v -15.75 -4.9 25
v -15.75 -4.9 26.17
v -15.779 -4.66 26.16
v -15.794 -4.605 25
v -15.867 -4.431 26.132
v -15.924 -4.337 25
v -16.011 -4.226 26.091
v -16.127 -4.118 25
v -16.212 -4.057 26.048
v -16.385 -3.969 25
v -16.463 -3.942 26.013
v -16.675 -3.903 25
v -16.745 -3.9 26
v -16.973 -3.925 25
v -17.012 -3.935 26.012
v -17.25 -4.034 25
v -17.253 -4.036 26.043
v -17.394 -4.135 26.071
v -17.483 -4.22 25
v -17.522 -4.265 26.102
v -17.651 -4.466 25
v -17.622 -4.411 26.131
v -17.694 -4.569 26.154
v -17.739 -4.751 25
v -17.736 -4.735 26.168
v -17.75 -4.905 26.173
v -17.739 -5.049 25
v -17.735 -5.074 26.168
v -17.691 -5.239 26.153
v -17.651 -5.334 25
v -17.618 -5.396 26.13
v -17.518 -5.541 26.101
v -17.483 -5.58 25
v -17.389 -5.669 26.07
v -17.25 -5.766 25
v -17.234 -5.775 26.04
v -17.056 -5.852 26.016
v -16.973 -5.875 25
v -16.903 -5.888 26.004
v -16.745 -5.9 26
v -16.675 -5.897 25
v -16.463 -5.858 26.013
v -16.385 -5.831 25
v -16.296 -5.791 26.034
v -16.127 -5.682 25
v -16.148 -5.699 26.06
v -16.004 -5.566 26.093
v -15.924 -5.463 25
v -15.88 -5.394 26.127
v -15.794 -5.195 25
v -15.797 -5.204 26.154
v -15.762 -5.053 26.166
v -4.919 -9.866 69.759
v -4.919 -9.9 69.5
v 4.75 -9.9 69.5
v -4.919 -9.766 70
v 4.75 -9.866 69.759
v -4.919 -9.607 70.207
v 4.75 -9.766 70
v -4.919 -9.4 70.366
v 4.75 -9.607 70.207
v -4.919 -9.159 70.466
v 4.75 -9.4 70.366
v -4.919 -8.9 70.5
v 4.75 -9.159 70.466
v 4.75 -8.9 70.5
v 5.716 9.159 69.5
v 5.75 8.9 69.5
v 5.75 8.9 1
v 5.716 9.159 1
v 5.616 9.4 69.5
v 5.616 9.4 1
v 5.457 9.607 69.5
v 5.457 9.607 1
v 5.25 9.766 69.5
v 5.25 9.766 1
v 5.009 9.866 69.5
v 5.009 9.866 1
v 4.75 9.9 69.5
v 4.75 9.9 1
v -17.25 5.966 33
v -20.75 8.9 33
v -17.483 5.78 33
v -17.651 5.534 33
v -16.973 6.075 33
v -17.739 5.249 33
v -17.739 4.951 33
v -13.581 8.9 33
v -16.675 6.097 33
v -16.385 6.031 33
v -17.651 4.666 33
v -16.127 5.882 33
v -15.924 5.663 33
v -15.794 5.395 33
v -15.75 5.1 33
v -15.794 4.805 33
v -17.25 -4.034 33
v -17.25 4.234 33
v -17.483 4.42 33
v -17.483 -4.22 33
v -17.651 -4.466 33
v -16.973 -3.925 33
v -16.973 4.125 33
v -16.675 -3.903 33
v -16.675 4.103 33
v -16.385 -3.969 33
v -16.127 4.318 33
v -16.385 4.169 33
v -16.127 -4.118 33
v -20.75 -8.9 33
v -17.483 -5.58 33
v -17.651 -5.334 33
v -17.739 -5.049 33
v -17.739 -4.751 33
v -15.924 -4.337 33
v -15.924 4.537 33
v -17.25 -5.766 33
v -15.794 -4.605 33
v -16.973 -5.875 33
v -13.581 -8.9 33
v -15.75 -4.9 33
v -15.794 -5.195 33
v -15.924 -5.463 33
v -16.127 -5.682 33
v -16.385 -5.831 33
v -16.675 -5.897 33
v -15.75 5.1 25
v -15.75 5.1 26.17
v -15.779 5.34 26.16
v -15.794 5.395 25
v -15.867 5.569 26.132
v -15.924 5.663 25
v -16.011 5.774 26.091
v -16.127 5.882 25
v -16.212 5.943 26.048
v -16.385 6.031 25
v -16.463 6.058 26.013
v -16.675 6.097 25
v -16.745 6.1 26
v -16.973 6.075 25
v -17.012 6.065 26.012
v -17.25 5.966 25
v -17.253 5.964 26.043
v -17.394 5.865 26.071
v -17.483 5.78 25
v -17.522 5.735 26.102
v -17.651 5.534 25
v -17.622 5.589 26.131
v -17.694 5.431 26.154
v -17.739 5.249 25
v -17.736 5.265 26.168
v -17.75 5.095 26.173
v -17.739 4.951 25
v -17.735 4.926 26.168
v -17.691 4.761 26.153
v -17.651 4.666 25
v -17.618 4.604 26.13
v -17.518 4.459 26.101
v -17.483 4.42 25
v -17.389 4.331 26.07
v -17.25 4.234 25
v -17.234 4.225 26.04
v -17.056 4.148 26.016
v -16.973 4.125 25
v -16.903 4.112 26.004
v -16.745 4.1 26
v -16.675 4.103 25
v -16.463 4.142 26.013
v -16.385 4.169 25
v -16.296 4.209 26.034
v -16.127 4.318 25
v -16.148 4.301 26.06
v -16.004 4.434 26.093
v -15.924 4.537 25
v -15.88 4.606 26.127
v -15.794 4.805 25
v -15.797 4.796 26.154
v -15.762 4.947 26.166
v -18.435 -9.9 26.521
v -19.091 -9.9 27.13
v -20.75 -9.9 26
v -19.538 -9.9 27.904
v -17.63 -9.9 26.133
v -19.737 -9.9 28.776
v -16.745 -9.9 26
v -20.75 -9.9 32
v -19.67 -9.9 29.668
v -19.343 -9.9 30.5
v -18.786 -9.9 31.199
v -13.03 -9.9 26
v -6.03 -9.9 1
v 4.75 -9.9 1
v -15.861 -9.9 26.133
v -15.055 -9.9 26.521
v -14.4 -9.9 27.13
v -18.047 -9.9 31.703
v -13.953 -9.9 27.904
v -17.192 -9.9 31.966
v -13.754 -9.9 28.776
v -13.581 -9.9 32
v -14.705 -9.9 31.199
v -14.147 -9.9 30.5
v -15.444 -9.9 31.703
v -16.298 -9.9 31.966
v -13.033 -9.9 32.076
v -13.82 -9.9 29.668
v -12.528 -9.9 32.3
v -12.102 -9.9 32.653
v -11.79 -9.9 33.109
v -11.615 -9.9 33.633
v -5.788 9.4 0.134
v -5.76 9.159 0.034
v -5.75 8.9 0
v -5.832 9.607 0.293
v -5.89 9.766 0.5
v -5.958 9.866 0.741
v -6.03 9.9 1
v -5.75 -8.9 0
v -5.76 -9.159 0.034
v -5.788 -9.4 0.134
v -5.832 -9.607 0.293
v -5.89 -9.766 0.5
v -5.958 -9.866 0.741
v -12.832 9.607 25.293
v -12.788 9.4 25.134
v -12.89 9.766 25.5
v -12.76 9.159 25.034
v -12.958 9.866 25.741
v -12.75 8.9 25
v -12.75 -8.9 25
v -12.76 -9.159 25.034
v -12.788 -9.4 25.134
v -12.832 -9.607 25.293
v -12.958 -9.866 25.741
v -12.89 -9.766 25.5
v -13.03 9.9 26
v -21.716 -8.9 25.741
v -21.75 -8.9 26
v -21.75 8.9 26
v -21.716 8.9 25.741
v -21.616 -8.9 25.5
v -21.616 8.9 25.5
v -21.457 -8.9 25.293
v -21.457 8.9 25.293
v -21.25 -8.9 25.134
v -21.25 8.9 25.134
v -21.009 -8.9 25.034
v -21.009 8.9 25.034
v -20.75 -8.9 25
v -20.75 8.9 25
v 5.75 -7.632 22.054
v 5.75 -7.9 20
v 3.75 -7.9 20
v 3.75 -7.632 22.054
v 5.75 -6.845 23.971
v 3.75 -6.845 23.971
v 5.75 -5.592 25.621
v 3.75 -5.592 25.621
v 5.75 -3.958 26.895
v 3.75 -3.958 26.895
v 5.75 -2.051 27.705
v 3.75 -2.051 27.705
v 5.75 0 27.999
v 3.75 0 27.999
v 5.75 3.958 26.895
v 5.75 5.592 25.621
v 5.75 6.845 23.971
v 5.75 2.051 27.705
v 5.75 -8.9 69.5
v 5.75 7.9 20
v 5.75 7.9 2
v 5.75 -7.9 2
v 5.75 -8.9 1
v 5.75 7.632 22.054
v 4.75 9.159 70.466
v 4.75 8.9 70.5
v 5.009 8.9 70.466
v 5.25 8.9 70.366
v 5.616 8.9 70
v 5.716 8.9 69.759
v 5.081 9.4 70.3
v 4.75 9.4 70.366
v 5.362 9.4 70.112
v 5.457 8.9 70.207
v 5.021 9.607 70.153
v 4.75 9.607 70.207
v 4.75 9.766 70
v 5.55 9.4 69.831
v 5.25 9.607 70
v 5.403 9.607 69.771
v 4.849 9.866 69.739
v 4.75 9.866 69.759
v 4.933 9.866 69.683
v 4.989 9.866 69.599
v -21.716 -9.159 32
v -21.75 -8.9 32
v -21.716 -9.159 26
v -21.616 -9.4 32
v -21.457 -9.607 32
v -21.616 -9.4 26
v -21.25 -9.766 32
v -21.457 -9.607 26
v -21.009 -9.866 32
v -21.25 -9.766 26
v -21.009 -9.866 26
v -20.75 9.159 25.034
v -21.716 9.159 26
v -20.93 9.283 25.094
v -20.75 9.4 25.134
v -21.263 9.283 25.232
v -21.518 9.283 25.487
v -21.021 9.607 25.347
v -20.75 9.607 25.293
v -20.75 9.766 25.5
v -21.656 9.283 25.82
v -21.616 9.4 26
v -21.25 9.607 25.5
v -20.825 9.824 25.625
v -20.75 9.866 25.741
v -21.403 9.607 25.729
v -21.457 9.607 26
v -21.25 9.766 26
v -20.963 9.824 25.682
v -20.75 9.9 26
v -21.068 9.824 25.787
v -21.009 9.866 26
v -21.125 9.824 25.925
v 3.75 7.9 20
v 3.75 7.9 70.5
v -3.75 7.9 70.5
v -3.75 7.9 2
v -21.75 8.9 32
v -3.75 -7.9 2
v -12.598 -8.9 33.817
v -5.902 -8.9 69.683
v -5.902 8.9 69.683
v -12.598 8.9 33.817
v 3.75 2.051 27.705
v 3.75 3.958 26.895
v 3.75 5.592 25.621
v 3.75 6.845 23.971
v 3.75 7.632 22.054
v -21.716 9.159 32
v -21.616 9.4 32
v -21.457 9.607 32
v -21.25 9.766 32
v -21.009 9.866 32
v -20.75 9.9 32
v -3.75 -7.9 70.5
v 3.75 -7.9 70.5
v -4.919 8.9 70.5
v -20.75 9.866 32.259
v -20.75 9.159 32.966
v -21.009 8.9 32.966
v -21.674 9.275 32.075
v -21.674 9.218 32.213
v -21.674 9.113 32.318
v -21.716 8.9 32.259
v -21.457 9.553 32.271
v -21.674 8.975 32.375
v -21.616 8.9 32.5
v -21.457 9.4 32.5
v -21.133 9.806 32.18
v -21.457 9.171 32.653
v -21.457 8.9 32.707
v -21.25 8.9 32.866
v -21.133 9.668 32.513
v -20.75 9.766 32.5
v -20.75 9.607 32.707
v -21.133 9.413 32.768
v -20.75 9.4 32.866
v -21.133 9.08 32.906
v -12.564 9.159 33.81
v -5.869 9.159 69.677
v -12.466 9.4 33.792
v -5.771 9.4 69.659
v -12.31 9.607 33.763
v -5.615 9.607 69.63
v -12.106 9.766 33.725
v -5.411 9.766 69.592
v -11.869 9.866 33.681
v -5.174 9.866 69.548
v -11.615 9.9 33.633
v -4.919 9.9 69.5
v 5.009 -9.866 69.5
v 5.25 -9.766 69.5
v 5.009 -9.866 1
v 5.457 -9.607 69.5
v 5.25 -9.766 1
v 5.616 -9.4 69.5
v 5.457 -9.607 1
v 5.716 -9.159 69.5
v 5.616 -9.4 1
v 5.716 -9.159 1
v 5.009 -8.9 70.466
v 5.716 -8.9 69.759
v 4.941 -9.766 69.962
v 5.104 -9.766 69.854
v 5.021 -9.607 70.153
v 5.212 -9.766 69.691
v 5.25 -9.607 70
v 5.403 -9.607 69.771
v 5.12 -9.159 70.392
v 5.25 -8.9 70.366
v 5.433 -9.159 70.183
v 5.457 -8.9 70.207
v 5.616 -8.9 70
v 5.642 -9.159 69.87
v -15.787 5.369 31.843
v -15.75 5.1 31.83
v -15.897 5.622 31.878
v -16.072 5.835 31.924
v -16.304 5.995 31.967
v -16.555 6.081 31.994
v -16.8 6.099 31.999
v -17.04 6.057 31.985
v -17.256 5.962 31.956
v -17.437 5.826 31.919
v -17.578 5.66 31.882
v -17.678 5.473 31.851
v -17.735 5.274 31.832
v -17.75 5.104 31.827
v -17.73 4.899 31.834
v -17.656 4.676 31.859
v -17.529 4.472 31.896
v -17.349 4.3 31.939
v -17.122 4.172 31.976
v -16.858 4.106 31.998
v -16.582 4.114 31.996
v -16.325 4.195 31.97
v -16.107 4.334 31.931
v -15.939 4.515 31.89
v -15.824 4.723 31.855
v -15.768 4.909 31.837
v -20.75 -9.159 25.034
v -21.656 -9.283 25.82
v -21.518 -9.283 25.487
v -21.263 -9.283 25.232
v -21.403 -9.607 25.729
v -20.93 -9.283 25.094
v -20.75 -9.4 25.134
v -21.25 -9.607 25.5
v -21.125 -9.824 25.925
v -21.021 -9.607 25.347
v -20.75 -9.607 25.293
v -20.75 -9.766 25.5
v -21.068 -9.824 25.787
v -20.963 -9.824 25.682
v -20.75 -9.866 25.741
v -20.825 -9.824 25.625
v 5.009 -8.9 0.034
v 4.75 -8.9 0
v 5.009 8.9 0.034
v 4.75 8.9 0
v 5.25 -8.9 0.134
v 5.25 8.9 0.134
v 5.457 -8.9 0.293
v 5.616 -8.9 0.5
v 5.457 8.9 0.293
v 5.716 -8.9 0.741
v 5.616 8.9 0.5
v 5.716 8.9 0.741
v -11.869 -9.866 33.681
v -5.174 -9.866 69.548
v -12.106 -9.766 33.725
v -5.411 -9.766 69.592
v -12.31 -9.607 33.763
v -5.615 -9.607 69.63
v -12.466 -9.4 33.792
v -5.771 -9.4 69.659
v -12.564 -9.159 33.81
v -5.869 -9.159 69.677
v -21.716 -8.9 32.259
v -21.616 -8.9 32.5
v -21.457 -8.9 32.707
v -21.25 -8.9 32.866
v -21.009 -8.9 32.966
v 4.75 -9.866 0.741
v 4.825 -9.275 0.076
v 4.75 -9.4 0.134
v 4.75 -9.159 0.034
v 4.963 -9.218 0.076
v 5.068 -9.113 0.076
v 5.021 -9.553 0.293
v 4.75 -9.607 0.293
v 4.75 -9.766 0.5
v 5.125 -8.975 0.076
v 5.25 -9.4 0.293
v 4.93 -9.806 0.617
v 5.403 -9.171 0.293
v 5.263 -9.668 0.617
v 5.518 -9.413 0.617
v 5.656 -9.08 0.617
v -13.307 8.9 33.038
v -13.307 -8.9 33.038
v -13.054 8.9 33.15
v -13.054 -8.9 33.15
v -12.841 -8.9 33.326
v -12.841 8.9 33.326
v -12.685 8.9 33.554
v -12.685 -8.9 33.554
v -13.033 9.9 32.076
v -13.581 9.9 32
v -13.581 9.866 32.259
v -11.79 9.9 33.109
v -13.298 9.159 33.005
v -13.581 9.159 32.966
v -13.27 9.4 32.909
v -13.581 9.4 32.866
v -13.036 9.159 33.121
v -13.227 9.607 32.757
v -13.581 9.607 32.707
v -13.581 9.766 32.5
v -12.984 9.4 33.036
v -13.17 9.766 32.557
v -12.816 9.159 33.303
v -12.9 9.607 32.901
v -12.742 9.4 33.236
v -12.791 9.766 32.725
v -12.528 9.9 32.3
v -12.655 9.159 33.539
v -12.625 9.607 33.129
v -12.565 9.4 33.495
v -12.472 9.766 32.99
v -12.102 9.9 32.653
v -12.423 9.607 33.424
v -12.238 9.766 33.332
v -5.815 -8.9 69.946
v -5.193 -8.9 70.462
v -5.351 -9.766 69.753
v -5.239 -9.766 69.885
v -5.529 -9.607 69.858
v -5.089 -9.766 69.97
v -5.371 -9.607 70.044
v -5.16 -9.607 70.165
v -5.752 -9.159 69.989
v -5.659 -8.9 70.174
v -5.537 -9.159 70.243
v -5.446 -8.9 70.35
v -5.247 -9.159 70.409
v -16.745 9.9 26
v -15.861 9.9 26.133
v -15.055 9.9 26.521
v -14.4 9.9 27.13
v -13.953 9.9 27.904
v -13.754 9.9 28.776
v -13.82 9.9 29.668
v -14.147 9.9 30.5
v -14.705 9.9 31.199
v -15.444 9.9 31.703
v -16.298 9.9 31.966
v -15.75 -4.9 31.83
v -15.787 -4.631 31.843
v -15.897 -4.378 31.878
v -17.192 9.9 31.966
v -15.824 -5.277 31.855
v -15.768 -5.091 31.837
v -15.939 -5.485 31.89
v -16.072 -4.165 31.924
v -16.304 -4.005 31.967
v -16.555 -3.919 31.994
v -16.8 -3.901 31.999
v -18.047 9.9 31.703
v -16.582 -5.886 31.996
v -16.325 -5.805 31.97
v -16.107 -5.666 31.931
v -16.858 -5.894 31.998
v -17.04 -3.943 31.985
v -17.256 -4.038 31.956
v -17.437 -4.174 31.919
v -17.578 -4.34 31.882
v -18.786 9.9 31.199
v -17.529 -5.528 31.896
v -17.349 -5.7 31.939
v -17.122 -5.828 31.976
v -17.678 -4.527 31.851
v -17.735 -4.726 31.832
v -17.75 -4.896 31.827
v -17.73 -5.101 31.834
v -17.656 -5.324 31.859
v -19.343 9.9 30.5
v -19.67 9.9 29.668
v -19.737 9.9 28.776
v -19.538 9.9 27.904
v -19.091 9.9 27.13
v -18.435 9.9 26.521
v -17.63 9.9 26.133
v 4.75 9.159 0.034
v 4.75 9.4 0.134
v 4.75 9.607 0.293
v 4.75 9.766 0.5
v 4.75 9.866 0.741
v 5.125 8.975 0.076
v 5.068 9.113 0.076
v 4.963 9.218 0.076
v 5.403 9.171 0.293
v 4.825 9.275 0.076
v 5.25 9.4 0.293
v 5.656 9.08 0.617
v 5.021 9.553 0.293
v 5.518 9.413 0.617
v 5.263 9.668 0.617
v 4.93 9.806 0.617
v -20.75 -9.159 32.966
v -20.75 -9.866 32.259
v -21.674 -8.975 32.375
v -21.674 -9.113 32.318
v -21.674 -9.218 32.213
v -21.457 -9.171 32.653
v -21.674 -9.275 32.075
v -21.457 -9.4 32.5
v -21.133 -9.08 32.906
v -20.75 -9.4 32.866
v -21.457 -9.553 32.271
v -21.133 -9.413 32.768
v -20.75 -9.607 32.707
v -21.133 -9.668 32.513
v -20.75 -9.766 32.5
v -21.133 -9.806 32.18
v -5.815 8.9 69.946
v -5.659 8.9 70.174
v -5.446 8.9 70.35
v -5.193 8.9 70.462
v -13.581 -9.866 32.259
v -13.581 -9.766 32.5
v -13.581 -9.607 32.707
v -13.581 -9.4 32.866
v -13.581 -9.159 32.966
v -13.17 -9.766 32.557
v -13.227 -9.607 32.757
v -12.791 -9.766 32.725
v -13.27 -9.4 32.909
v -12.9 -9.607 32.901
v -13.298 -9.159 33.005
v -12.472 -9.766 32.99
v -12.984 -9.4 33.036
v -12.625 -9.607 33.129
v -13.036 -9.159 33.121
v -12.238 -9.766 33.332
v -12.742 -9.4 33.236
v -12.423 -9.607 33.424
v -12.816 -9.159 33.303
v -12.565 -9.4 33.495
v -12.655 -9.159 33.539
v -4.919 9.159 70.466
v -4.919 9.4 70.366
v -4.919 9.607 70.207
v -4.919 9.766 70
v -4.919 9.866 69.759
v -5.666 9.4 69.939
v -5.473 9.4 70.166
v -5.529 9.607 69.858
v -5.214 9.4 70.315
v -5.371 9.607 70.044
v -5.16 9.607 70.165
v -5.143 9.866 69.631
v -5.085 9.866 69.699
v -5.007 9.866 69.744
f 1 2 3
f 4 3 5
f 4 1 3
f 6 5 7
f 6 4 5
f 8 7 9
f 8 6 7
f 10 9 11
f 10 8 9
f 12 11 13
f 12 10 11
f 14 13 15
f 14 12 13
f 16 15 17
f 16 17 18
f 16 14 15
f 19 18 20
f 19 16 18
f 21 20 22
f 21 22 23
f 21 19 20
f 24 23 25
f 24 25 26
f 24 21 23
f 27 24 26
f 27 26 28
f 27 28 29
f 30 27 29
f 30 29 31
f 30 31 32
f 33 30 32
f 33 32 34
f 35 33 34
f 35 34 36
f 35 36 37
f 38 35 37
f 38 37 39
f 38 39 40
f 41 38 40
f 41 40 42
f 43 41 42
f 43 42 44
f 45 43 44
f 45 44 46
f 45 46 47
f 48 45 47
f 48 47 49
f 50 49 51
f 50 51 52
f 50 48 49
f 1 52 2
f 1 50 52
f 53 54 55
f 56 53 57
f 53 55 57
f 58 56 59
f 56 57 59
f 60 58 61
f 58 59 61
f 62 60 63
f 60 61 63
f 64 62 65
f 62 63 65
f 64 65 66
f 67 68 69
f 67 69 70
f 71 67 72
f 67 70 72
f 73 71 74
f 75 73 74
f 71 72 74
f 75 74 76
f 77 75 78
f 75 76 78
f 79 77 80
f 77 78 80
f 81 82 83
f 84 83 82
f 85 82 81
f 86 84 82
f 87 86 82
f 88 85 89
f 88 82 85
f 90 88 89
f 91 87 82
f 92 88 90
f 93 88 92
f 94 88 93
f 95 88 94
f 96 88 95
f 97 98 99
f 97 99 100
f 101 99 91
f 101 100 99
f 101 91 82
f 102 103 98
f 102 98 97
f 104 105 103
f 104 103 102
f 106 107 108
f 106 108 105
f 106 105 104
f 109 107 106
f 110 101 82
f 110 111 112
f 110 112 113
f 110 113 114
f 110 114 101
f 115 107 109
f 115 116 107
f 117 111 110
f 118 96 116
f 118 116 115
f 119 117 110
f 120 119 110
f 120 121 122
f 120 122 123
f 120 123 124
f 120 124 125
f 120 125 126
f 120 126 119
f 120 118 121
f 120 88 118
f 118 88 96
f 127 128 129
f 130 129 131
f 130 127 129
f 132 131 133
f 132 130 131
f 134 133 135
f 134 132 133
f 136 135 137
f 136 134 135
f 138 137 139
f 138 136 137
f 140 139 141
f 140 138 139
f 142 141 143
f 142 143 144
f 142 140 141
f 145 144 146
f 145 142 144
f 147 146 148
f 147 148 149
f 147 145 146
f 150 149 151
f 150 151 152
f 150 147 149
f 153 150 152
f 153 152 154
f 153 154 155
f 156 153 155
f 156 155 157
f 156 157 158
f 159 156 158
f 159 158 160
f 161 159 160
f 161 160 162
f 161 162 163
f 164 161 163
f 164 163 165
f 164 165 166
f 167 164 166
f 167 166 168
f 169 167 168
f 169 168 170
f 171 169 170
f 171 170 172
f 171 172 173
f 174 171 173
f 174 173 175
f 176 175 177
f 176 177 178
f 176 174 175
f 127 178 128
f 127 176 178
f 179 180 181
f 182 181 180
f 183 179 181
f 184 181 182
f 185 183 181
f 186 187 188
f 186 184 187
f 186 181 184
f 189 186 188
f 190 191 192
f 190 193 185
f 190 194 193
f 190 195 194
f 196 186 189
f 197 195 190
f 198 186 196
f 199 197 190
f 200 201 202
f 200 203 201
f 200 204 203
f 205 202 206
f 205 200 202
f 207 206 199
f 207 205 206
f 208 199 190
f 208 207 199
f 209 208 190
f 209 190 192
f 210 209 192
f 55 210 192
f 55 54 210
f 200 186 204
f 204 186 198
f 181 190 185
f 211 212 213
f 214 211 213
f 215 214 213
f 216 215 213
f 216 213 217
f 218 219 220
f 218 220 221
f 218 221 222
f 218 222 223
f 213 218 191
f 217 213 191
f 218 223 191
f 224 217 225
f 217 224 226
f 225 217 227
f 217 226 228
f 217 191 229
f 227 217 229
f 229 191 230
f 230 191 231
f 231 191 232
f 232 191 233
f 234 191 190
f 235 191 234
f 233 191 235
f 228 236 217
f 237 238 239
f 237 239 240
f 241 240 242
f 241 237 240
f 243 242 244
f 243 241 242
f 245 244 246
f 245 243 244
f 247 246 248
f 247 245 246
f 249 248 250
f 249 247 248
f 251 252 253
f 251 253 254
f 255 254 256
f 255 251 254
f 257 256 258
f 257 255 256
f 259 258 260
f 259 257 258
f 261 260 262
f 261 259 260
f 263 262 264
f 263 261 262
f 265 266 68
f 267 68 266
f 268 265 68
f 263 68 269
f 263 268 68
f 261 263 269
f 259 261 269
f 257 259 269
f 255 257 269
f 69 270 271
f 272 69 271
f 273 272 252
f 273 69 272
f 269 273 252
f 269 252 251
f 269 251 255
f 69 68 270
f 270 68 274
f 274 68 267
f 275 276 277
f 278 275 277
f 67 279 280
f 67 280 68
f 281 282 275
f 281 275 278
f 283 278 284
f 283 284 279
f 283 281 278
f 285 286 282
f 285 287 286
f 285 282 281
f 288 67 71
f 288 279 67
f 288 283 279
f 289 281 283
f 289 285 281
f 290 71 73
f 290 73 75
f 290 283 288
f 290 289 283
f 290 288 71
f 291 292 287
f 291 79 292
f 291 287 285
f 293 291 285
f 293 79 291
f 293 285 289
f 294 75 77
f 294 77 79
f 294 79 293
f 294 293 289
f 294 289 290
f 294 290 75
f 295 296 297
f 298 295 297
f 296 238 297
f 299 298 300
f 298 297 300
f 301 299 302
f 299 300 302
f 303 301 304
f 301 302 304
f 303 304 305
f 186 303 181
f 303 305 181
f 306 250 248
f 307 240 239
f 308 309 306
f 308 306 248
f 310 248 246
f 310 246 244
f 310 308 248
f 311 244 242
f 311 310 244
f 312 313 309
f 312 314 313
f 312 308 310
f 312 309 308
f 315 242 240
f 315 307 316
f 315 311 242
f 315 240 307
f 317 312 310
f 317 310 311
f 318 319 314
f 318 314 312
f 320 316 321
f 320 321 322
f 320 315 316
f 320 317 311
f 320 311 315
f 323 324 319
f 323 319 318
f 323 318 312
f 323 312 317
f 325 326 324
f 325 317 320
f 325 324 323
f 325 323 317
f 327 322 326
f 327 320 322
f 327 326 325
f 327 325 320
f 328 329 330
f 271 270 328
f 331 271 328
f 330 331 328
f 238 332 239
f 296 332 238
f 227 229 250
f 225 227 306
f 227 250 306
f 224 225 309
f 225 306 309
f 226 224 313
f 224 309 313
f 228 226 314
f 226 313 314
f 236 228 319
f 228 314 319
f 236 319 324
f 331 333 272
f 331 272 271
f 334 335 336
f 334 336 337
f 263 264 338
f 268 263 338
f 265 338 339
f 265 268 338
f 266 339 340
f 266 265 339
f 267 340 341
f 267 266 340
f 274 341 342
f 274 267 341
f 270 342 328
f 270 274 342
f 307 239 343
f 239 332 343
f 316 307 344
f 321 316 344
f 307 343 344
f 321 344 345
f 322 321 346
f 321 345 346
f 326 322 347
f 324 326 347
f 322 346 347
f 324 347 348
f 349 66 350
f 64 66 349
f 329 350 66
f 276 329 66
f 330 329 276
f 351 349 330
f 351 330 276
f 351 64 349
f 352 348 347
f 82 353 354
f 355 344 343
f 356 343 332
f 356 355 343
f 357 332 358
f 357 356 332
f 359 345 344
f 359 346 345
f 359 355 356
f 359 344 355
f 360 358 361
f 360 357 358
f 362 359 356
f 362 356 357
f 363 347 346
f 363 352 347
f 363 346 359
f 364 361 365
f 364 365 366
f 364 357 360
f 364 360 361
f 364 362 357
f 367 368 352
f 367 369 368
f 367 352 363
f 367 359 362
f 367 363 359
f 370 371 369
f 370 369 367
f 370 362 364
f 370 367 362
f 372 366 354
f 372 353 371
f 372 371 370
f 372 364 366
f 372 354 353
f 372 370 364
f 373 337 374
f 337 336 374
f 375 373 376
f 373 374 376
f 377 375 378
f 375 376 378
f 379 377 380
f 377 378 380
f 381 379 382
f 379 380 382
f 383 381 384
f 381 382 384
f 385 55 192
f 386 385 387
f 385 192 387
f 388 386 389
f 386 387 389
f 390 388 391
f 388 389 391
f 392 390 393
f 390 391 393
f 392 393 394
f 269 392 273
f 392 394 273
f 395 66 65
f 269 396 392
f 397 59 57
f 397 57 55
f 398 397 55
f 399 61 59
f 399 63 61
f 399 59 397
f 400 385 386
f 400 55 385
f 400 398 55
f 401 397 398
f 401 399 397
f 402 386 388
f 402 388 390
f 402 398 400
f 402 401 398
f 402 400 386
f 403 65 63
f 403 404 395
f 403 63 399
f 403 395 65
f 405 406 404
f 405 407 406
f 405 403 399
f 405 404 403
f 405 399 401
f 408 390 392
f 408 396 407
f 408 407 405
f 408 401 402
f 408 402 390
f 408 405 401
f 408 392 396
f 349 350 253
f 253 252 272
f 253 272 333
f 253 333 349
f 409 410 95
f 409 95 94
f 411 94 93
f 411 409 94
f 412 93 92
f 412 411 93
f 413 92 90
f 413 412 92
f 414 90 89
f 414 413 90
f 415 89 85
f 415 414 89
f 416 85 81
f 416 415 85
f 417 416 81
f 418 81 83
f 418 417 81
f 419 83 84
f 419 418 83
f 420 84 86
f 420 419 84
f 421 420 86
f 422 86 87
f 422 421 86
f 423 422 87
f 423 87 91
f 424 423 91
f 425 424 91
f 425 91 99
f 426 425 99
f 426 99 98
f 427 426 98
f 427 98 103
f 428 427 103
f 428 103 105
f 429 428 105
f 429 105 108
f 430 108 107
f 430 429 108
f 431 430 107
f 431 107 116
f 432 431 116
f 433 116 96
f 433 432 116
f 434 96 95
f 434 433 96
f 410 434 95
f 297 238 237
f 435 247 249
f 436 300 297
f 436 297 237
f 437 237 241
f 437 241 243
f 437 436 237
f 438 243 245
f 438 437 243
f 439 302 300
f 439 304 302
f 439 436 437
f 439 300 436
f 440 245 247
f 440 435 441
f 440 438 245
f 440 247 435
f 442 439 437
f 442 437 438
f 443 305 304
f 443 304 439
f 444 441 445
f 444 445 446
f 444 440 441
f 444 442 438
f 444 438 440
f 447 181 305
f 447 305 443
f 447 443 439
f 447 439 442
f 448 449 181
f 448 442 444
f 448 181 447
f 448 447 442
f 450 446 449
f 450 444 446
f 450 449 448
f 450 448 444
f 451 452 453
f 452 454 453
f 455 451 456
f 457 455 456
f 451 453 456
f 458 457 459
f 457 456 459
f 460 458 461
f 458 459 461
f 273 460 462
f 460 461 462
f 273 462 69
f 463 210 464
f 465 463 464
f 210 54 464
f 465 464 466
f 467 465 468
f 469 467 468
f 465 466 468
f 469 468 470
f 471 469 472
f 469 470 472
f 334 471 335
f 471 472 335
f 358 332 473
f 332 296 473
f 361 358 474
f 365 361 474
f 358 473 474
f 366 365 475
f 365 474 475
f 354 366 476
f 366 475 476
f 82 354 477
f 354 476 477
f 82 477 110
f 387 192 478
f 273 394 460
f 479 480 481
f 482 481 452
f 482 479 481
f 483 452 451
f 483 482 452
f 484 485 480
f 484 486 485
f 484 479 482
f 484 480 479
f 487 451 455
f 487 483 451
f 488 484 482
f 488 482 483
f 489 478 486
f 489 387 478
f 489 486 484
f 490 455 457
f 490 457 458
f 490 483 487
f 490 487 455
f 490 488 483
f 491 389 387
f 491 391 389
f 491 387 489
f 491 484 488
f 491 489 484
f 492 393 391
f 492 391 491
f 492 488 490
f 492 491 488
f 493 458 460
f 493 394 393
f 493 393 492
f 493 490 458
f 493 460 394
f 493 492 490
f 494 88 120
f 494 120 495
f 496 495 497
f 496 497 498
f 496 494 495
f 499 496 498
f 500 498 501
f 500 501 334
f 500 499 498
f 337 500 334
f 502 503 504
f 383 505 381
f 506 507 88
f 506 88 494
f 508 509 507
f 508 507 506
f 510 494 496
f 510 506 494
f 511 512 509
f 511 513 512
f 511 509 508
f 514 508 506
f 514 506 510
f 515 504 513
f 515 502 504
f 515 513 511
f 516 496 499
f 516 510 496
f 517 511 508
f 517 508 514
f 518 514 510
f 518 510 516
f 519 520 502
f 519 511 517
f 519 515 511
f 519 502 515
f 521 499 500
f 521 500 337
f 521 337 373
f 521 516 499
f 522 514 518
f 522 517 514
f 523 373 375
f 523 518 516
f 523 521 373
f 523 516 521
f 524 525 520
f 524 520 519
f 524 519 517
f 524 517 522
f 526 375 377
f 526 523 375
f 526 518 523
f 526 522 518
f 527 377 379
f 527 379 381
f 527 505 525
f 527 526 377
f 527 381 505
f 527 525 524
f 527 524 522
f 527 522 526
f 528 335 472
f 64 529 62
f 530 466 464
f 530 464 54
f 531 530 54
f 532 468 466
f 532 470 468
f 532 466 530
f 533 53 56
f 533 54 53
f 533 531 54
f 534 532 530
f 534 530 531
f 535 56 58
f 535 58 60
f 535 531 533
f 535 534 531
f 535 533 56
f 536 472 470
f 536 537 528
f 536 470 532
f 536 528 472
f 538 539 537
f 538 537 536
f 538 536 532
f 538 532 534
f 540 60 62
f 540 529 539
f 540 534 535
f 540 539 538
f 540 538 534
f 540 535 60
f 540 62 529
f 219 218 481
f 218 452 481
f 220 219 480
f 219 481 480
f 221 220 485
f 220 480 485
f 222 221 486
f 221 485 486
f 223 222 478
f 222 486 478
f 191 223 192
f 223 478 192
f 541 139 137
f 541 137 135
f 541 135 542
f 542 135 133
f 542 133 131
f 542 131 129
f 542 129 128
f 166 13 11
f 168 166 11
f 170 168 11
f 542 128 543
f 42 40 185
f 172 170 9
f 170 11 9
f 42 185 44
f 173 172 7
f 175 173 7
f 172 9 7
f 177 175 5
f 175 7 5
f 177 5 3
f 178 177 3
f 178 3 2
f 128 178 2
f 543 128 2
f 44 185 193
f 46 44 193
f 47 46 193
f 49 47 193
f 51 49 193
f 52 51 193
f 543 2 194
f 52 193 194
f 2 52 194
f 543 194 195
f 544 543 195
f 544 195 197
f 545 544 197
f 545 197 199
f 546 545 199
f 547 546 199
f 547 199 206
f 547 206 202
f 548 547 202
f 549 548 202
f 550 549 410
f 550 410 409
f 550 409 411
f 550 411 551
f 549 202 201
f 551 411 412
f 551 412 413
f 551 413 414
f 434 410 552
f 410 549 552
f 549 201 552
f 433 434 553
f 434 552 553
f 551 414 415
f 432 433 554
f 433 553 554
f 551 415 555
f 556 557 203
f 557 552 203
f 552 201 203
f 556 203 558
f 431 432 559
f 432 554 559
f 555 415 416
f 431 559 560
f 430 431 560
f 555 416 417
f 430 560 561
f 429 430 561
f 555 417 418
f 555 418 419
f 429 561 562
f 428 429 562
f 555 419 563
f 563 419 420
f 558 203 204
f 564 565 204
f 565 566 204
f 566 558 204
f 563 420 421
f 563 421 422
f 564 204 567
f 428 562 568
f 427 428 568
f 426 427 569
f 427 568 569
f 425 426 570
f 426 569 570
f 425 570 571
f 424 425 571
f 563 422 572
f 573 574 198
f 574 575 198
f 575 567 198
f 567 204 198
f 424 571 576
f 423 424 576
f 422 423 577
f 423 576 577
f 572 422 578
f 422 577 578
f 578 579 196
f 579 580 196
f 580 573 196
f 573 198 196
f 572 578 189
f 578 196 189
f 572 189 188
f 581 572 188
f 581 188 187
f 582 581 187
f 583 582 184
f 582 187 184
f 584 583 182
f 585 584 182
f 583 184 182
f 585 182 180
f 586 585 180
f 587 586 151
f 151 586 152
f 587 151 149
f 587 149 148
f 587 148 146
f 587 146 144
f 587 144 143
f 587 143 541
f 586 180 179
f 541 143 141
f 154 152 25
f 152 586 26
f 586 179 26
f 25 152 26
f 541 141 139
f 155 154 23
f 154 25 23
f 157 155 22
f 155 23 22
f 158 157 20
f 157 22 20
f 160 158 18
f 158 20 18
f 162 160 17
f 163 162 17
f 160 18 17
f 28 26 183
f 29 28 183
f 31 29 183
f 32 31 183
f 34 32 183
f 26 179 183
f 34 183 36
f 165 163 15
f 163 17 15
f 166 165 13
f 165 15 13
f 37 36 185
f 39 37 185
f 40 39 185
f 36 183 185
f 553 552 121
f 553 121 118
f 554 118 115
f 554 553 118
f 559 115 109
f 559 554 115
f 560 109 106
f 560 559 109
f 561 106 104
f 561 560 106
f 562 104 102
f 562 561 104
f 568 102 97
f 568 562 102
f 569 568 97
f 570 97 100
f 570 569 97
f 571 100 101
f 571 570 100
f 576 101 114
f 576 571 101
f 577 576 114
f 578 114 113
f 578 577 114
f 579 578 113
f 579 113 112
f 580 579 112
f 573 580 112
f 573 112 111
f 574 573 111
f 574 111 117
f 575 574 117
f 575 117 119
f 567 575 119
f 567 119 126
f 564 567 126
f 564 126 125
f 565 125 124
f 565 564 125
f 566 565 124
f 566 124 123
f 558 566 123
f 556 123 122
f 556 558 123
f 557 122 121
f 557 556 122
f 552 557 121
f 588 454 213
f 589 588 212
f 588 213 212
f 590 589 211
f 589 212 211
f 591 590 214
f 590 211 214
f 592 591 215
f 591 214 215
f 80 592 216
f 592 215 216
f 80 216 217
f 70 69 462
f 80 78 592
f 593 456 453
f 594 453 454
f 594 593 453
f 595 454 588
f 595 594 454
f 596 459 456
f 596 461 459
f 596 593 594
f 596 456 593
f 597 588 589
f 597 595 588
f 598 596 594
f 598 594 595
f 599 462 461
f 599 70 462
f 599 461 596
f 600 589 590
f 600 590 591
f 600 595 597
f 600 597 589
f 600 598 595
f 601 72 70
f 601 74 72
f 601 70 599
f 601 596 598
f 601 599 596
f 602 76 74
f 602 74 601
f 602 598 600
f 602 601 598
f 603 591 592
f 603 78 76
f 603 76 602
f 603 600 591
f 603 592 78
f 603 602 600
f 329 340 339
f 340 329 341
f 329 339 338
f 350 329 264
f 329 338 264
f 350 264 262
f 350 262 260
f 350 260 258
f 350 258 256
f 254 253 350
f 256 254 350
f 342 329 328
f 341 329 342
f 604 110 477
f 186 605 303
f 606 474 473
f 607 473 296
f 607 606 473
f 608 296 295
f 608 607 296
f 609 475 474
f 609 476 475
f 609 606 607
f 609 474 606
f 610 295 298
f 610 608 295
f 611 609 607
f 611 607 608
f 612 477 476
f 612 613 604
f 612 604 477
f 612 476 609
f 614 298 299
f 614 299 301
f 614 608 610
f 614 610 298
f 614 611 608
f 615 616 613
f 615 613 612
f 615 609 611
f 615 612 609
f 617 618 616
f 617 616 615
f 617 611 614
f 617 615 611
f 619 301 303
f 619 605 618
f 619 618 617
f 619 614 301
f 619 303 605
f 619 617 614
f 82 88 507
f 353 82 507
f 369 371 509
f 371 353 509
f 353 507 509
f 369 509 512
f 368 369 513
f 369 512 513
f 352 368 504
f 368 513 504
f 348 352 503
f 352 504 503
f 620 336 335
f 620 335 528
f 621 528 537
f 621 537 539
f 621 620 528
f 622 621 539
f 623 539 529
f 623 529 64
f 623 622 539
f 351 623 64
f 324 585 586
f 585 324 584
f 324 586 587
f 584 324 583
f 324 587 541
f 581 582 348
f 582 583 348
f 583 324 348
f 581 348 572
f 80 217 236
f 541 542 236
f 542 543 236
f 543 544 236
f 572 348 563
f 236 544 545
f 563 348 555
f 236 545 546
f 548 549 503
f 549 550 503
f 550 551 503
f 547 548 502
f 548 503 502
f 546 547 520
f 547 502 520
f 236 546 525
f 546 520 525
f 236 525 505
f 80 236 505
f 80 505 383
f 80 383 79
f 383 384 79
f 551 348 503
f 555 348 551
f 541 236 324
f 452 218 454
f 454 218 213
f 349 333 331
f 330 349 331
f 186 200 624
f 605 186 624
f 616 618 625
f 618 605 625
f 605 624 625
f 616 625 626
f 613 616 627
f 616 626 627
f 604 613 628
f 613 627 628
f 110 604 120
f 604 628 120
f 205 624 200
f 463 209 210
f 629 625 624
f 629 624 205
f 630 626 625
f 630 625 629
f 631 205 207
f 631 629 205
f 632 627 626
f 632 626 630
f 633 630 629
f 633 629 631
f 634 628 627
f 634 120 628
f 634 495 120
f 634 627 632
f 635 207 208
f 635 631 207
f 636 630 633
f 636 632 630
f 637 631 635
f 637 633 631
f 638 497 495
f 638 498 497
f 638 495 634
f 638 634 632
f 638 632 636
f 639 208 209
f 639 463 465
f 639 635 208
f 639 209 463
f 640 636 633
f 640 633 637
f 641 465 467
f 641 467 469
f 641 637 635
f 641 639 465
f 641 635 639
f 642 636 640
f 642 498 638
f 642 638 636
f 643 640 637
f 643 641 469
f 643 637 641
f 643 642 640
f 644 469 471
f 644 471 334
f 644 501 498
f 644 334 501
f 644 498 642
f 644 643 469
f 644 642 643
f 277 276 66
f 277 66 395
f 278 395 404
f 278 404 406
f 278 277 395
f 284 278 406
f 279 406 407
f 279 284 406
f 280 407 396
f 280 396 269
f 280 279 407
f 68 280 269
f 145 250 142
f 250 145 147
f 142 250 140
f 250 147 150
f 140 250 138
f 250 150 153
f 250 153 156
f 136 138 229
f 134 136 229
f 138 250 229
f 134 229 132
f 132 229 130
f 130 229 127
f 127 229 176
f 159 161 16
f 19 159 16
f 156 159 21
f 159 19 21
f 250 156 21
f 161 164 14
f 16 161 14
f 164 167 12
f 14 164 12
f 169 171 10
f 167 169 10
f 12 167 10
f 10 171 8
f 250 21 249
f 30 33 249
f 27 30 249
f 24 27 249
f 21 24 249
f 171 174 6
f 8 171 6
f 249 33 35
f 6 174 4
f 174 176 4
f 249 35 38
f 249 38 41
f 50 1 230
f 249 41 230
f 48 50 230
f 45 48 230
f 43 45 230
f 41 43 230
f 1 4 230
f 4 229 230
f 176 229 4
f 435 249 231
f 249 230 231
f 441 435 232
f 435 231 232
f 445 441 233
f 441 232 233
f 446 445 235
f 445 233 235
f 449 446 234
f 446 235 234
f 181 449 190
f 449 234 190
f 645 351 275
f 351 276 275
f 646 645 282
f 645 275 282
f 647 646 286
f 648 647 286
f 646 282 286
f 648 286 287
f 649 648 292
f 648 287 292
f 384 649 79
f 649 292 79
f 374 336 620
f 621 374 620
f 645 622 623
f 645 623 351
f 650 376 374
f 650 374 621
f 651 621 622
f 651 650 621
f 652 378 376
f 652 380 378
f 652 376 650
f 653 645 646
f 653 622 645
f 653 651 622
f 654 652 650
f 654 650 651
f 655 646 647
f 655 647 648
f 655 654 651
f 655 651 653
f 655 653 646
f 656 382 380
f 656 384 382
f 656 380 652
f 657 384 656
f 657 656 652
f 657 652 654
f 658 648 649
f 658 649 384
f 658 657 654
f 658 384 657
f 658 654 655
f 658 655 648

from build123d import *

# Parameters (mm, degrees)
CROQUIS1_W                 = 19.8
CROQUIS1_H                 = 11.5
SALIENTE_EXTRUIR1_DEPTH    = 70.5
VACIADO1_T                 = -2
CROQUIS5_W                 = 15.8
CROQUIS5_H                 = 2
SALIENTE_EXTRUIR2_DEPTH    = 2
CROQUIS6_W                 = 19.8
CROQUIS6_H                 = 8
SALIENTE_EXTRUIR4_DEPTH    = 16
SALIENTE_EXTRUIR5_DEPTH    = 19.8
CROQUIS10_R                = 3
CORTAR_EXTRUIR4_DEPTH      = 19.8
CORTAR_EXTRUIR3_DEPTH      = 43.653516854
CORTAR_EXTRUIR3_DEPTH_BACK = 43.653516854
CROQUIS8_R                 = 1
CROQUIS11_W                = 15.8
CROQUIS11_H                = 26
CORTAR_EXTRUIR5_DEPTH      = 2
REDONDEO2_R                = 8
REDONDEO4_R                = 1
REDONDEO5_R                = 1
REDONDEO6_R                = 1
REDONDEO7_R                = 1
REDONDEO8_R                = 1


# Some blends are built 0.0001 mm under size
with BuildPart() as part:
    # Croquis1 → Saliente-Extruir1 (new body)
    with BuildSketch(Plane(origin=(0, 0, 0), x_dir=(0, 1, 0), z_dir=(0, 0, 1))):
        Rectangle(CROQUIS1_W, CROQUIS1_H)
    extrude(amount=SALIENTE_EXTRUIR1_DEPTH)

    # Vaciado1
    vaciado1_openings = [part.faces().sort_by_distance(p)[0] for p in [
        (0, 0, 70.5),
    ]]
    offset(amount=VACIADO1_T, openings=vaciado1_openings, kind=Kind.INTERSECTION)

    # Croquis5 → Saliente-Extruir2 (add)
    with BuildSketch(Plane.YZ.offset(5.75)):
        with Locations((0, 69.5)):
            Rectangle(CROQUIS5_W, CROQUIS5_H)
    extrude(amount=-SALIENTE_EXTRUIR2_DEPTH)

    # Croquis6 → Saliente-Extruir4 (add)
    with BuildSketch(Plane(origin=(-5.75, 0, 0), x_dir=(0, -1, 0), z_dir=(-1, 0, 0))):
        with Locations((0, 29)):
            Rectangle(CROQUIS6_W, CROQUIS6_H)
    extrude(amount=SALIENTE_EXTRUIR4_DEPTH)

    # Croquis9 → Saliente-Extruir5 (add)
    with BuildSketch(Plane.XZ.offset(9.9)):
        Polygon((-5.75, 70.5), (-12.75, 33), (-5.75, 33), align=None)
        Polygon((-5.75, 0), (-12.75, 25), (-5.75, 25), align=None)
    extrude(amount=-SALIENTE_EXTRUIR5_DEPTH)

    # Croquis10 → Cortar-Extruir4 (cut)
    with BuildSketch(Plane.XZ.offset(9.9)):
        with Locations(Location((-16.745253682, 29, 0), (0, 0, 270))):
            Circle(CROQUIS10_R)
    extrude(amount=-CORTAR_EXTRUIR4_DEPTH, mode=Mode.SUBTRACT)

    # Croquis8 → Cortar-Extruir3 (cut, two sides: drawn at the far end of the back side and taken through both)
    with BuildSketch(Plane(origin=(-4, 0, 33), x_dir=(1, 0, 0), z_dir=(0, 0, 1)).offset(-CORTAR_EXTRUIR3_DEPTH_BACK)):
        with Locations((-12.75, 5.1)):
            Circle(CROQUIS8_R)
        with Locations((-12.75, -4.9)):
            Circle(CROQUIS8_R)
    extrude(amount=CORTAR_EXTRUIR3_DEPTH + CORTAR_EXTRUIR3_DEPTH_BACK, mode=Mode.SUBTRACT)

    # Croquis11 → Cortar-Extruir5 (cut)
    with BuildSketch(Plane.YZ.offset(5.75)):
        with Locations((0, 15)):
            Rectangle(CROQUIS11_W, CROQUIS11_H)
    extrude(amount=-CORTAR_EXTRUIR5_DEPTH, mode=Mode.SUBTRACT)

    # Redondeo2
    # the kernel refuses this fillet: 8 mm, written as the material it adds along each edge
    with BuildSketch(Plane(origin=(5.75, -7.9, 28), x_dir=(0, 1, 0), z_dir=(-1, 0, 0)), Plane(origin=(5.75, 7.9, 28), x_dir=(0, 0, -1), z_dir=(-1, 0, 0))) as redondeo2_piece_1:
        with BuildLine():
            CenterArc((REDONDEO2_R, REDONDEO2_R), REDONDEO2_R, 180, 90)
            Line((0, REDONDEO2_R), (0, 0))
            Line((0, 0), (REDONDEO2_R, 0))
        make_face()
    extrude(amount=2)

    # Redondeo4
    redondeo4_edges = [part.edges().sort_by_distance(p)[0] for p in [
        (-12.75, 0, 33),
    ]]
    fillet(redondeo4_edges, radius=REDONDEO4_R)

    # Redondeo5
    redondeo5_edges = [part.edges().sort_by_distance(p)[0] for p in [
        (5.75, 0, 70.5),
        (-5.75, 0, 70.5),
    ]]
    fillet(redondeo5_edges, radius=REDONDEO5_R)

    # Redondeo6
    redondeo6_edges = [part.edges().sort_by_distance(p)[0] for p in [
        (-12.941660805, -9.9, 33.230748054),
        (-12.941660805, 9.9, 33.230748054),
        (-9.25, 9.9, 51.75),
        (-9.25, -9.9, 51.75),
        (-0.084696812, 9.9, 70.5),
        (5.75, 9.9, 34.75),
        (5.457106781, 9.9, 70.207106781),
        (-5.558339195, 9.9, 70.269251946),
        (-0.084696812, -9.9, 70.5),
        (5.75, -9.9, 34.75),
        (5.457106781, -9.9, 70.207106781),
        (-5.558339195, -9.9, 70.269251946),
        (-17.665303188, 9.9, 33),
        (-17.665303188, -9.9, 33),
    ]]
    fillet(redondeo6_edges, radius=REDONDEO6_R - 0.0001)  # a hair under: the kernel refuses the full size

    # Redondeo7
    redondeo7_edges = [part.edges().sort_by_distance(p)[0] for p in [
        (-0.49995, 9.9, 0),
        (5.75, 0, 0),
        (-0.49995, -9.9, 0),
        (5.457136071, -9.607136071, 0),
        (5.457136071, 9.607136071, 0),
        (-21.75, 0, 25),
    ]]
    fillet(redondeo7_edges, radius=REDONDEO7_R - 0.0001)  # a hair under: the kernel refuses the full size

    # Redondeo8
    redondeo8_edges = [part.edges().sort_by_distance(p)[0] for p in [
        (-21.75, 9.9, 29),
        (-21.75, 0, 33),
        (-21.75, -9.607136071, 32.707136071),
        (-21.75, 9.607136071, 32.707136071),
        (-21.75, -9.9, 29),
        (-16.75005, -9.9, 25),
        (-21.457136071, -9.9, 25.292863929),
        (-16.75005, 9.9, 25),
        (-21.457136071, 9.9, 25.292863929),
    ]]
    fillet(redondeo8_edges, radius=REDONDEO8_R - 0.0001)  # a hair under: the kernel refuses the full size


solid = part.part
